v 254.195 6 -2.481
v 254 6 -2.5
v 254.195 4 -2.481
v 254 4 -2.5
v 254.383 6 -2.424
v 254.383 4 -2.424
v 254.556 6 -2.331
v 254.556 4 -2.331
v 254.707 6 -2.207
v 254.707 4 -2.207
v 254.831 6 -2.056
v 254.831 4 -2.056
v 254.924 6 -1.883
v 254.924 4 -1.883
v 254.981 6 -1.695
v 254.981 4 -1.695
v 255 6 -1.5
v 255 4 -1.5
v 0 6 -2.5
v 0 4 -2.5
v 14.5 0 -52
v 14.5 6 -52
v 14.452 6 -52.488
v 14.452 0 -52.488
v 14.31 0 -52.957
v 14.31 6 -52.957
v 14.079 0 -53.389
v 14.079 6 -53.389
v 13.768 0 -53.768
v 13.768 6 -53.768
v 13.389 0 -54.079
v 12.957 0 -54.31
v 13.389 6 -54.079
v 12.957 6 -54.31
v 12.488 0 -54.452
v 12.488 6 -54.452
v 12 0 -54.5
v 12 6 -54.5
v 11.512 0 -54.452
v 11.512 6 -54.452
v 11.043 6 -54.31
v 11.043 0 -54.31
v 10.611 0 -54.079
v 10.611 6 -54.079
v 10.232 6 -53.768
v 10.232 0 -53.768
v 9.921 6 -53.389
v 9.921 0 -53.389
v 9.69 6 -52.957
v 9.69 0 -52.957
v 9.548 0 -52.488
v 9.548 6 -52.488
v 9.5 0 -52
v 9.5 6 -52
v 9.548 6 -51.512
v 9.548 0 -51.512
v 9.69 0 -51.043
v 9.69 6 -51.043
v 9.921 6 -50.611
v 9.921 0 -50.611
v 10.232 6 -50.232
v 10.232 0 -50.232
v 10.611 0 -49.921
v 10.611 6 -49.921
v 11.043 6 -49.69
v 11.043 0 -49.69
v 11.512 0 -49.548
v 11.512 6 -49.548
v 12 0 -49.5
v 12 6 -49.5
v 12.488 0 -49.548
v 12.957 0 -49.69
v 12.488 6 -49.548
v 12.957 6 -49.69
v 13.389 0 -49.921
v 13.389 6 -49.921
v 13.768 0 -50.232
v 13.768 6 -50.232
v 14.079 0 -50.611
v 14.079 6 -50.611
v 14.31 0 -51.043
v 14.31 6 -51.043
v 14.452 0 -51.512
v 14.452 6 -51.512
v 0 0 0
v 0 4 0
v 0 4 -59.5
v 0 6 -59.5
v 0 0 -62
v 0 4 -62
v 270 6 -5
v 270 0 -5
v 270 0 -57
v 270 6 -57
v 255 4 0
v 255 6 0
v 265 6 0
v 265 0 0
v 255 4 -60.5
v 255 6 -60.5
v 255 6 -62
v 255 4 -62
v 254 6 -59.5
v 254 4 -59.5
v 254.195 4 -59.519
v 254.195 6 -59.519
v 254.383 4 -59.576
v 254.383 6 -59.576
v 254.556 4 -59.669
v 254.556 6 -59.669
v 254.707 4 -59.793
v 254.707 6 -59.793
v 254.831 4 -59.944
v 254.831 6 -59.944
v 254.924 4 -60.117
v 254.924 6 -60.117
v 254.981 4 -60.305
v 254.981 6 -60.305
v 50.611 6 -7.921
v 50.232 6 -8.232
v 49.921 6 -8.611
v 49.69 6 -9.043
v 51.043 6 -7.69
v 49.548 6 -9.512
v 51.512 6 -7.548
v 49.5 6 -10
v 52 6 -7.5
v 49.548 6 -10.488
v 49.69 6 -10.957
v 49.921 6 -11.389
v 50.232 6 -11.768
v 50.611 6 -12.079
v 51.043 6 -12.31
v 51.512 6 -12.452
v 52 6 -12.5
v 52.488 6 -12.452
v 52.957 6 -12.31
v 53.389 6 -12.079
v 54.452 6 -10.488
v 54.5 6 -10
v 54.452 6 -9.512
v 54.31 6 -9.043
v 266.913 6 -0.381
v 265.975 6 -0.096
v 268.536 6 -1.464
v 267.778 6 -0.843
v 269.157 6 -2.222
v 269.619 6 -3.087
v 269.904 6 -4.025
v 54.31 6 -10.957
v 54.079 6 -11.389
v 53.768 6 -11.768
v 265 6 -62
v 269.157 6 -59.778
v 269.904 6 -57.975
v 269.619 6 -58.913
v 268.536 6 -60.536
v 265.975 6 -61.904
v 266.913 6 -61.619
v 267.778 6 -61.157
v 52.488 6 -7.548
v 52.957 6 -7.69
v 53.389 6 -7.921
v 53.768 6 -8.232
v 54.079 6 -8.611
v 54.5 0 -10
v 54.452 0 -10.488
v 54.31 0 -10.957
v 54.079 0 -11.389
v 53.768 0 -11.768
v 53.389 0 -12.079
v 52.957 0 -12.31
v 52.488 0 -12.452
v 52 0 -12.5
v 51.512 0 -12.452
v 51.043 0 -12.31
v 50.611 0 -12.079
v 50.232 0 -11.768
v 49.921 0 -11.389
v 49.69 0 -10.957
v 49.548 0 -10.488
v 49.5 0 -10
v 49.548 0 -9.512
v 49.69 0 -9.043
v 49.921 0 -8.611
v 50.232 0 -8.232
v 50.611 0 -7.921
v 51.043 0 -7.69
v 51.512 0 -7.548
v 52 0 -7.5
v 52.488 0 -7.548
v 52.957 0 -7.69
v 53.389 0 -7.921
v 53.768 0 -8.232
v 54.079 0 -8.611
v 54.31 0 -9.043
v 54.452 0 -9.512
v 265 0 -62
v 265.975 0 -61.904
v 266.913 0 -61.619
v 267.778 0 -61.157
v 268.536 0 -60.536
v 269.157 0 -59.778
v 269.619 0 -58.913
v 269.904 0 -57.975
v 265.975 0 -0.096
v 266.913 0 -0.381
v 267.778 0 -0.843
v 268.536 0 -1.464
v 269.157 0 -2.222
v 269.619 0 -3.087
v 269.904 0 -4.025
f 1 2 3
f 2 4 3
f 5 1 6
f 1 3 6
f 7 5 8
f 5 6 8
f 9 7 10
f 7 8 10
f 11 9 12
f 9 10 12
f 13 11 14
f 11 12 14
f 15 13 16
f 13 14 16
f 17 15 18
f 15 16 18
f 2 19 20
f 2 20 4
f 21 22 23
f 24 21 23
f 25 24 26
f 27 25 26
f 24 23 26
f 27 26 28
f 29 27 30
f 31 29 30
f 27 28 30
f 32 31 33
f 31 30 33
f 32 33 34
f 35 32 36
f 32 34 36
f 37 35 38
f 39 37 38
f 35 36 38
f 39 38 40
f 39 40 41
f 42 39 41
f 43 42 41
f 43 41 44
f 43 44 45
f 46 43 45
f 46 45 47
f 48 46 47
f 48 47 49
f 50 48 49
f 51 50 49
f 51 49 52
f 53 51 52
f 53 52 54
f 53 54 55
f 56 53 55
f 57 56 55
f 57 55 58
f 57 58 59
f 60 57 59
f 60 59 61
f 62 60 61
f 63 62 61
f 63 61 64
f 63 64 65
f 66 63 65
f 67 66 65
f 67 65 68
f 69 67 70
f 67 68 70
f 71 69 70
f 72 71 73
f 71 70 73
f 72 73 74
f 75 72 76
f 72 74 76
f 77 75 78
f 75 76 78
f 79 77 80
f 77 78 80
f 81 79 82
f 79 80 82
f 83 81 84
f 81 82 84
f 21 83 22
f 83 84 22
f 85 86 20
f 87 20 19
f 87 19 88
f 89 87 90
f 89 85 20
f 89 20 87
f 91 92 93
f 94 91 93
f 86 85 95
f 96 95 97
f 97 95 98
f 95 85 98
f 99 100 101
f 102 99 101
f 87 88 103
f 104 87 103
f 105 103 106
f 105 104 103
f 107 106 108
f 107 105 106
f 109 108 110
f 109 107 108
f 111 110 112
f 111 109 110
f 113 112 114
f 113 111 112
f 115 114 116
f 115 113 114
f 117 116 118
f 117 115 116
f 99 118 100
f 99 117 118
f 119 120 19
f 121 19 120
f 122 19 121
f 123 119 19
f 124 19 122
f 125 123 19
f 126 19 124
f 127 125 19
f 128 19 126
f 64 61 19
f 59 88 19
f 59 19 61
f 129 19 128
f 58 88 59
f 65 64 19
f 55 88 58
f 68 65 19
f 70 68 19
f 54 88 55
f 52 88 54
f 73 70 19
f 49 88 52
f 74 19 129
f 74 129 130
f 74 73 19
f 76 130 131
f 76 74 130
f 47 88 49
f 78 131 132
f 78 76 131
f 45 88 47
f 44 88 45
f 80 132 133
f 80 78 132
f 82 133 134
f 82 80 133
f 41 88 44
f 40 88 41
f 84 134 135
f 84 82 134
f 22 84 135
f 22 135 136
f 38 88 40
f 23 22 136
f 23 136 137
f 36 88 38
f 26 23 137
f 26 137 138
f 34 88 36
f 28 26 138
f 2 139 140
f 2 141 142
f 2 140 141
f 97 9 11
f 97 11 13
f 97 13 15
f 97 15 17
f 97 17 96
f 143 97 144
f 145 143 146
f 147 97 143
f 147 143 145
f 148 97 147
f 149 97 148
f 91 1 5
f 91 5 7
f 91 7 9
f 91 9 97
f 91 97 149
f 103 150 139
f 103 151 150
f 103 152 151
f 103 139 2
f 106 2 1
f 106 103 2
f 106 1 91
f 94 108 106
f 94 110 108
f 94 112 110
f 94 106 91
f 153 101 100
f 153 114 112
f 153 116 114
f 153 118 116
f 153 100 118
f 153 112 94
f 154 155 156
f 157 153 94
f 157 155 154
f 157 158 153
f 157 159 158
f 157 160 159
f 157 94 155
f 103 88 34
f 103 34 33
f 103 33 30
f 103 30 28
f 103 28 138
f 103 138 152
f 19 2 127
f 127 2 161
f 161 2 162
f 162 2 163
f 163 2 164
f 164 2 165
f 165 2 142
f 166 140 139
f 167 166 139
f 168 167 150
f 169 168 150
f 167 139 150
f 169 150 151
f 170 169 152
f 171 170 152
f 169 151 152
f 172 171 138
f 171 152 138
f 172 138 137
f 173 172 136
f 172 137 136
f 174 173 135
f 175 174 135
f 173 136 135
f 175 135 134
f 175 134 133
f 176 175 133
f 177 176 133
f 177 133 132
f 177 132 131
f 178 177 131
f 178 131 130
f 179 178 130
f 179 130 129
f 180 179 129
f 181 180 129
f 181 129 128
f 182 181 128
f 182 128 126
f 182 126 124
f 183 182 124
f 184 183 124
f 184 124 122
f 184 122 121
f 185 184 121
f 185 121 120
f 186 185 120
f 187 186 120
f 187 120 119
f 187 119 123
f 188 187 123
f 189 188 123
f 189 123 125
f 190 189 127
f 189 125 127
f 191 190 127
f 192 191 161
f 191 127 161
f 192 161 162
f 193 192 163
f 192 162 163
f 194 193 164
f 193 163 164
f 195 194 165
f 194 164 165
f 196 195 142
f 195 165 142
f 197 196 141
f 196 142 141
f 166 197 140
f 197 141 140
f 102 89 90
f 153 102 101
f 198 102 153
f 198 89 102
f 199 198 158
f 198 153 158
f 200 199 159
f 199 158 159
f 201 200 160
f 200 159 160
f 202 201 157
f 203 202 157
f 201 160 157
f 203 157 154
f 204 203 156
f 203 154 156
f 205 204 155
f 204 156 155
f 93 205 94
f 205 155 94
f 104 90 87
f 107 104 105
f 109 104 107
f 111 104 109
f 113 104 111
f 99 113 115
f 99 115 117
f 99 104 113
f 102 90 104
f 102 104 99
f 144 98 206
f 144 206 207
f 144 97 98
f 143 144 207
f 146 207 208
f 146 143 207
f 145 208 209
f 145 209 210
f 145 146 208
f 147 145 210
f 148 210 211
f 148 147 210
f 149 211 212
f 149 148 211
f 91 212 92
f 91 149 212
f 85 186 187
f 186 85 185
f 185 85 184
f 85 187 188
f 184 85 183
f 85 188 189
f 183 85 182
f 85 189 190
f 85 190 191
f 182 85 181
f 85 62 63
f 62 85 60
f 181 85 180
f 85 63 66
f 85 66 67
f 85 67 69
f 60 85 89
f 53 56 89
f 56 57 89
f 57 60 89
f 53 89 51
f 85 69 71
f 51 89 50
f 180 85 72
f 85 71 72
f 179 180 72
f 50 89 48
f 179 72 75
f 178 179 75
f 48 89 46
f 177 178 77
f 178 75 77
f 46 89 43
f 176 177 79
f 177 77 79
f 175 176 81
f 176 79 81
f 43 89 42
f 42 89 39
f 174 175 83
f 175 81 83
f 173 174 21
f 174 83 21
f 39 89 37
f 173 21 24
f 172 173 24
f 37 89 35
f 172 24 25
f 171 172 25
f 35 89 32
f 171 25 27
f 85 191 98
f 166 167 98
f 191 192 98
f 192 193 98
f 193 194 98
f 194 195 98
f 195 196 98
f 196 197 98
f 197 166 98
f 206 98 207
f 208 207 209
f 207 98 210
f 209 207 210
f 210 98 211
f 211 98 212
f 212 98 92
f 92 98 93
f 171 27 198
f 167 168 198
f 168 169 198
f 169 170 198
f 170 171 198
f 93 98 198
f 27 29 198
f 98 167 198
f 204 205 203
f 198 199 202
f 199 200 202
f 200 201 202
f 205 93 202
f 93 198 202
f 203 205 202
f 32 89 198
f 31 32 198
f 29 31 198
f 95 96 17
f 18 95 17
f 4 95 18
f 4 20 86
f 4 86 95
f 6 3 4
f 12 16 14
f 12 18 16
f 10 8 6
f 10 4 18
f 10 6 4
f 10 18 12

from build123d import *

# Parameters (mm, degrees)
SKETCH1_W           = 270
SKETCH1_H           = 62
BOSS_EXTRUDE1_DEPTH = 6
SKETCH2_W           = 255
SKETCH2_H           = 2.5
CUT_EXTRUDE1_DEPTH  = 2
FILLET1_R           = 1
SKETCH3_R           = 2.5
CUT_EXTRUDE2_DEPTH  = 7
FILLET2_R           = 5


with BuildPart() as part:
    # Sketch1 → Boss-Extrude1 (new body)
    with BuildSketch(Plane(origin=(0, 0, 0), x_dir=(1, 0, 0), z_dir=(0, 1, 0))):
        with Locations((135, 31)):
            Rectangle(SKETCH1_W, SKETCH1_H)
    extrude(amount=BOSS_EXTRUDE1_DEPTH)

    # Sketch2 → Cut-Extrude1 (cut)
    with BuildSketch(Plane(origin=(0, 6, 0), x_dir=(1, 0, 0), z_dir=(0, 1, 0))):
        with Locations((127.5, 60.75)):
            Rectangle(SKETCH2_W, SKETCH2_H)
        with Locations((127.5, 1.25)):
            Rectangle(SKETCH2_W, SKETCH2_H)
    extrude(amount=-CUT_EXTRUDE1_DEPTH, mode=Mode.SUBTRACT)

    # Fillet1
    fillet1_edges = [part.edges().sort_by_distance(p)[0] for p in [
        (255, 5, -59.5),
        (255, 5, -2.5),
    ]]
    fillet(fillet1_edges, radius=FILLET1_R)

    # Sketch3 → Cut-Extrude2 (cut, through all)
    with BuildSketch(Plane(origin=(0, 6, 0), x_dir=(1, 0, 0), z_dir=(0, 1, 0))):
        with Locations((12, 52)):
            Circle(SKETCH3_R)
        with Locations((52, 10)):
            Circle(SKETCH3_R)
    extrude(amount=-CUT_EXTRUDE2_DEPTH, mode=Mode.SUBTRACT)

    # Fillet2
    fillet2_edges = [part.edges().sort_by_distance(p)[0] for p in [
        (270, 3, -62),
        (270, 3, 0),
    ]]
    fillet(fillet2_edges, radius=FILLET2_R)


solid = part.part
